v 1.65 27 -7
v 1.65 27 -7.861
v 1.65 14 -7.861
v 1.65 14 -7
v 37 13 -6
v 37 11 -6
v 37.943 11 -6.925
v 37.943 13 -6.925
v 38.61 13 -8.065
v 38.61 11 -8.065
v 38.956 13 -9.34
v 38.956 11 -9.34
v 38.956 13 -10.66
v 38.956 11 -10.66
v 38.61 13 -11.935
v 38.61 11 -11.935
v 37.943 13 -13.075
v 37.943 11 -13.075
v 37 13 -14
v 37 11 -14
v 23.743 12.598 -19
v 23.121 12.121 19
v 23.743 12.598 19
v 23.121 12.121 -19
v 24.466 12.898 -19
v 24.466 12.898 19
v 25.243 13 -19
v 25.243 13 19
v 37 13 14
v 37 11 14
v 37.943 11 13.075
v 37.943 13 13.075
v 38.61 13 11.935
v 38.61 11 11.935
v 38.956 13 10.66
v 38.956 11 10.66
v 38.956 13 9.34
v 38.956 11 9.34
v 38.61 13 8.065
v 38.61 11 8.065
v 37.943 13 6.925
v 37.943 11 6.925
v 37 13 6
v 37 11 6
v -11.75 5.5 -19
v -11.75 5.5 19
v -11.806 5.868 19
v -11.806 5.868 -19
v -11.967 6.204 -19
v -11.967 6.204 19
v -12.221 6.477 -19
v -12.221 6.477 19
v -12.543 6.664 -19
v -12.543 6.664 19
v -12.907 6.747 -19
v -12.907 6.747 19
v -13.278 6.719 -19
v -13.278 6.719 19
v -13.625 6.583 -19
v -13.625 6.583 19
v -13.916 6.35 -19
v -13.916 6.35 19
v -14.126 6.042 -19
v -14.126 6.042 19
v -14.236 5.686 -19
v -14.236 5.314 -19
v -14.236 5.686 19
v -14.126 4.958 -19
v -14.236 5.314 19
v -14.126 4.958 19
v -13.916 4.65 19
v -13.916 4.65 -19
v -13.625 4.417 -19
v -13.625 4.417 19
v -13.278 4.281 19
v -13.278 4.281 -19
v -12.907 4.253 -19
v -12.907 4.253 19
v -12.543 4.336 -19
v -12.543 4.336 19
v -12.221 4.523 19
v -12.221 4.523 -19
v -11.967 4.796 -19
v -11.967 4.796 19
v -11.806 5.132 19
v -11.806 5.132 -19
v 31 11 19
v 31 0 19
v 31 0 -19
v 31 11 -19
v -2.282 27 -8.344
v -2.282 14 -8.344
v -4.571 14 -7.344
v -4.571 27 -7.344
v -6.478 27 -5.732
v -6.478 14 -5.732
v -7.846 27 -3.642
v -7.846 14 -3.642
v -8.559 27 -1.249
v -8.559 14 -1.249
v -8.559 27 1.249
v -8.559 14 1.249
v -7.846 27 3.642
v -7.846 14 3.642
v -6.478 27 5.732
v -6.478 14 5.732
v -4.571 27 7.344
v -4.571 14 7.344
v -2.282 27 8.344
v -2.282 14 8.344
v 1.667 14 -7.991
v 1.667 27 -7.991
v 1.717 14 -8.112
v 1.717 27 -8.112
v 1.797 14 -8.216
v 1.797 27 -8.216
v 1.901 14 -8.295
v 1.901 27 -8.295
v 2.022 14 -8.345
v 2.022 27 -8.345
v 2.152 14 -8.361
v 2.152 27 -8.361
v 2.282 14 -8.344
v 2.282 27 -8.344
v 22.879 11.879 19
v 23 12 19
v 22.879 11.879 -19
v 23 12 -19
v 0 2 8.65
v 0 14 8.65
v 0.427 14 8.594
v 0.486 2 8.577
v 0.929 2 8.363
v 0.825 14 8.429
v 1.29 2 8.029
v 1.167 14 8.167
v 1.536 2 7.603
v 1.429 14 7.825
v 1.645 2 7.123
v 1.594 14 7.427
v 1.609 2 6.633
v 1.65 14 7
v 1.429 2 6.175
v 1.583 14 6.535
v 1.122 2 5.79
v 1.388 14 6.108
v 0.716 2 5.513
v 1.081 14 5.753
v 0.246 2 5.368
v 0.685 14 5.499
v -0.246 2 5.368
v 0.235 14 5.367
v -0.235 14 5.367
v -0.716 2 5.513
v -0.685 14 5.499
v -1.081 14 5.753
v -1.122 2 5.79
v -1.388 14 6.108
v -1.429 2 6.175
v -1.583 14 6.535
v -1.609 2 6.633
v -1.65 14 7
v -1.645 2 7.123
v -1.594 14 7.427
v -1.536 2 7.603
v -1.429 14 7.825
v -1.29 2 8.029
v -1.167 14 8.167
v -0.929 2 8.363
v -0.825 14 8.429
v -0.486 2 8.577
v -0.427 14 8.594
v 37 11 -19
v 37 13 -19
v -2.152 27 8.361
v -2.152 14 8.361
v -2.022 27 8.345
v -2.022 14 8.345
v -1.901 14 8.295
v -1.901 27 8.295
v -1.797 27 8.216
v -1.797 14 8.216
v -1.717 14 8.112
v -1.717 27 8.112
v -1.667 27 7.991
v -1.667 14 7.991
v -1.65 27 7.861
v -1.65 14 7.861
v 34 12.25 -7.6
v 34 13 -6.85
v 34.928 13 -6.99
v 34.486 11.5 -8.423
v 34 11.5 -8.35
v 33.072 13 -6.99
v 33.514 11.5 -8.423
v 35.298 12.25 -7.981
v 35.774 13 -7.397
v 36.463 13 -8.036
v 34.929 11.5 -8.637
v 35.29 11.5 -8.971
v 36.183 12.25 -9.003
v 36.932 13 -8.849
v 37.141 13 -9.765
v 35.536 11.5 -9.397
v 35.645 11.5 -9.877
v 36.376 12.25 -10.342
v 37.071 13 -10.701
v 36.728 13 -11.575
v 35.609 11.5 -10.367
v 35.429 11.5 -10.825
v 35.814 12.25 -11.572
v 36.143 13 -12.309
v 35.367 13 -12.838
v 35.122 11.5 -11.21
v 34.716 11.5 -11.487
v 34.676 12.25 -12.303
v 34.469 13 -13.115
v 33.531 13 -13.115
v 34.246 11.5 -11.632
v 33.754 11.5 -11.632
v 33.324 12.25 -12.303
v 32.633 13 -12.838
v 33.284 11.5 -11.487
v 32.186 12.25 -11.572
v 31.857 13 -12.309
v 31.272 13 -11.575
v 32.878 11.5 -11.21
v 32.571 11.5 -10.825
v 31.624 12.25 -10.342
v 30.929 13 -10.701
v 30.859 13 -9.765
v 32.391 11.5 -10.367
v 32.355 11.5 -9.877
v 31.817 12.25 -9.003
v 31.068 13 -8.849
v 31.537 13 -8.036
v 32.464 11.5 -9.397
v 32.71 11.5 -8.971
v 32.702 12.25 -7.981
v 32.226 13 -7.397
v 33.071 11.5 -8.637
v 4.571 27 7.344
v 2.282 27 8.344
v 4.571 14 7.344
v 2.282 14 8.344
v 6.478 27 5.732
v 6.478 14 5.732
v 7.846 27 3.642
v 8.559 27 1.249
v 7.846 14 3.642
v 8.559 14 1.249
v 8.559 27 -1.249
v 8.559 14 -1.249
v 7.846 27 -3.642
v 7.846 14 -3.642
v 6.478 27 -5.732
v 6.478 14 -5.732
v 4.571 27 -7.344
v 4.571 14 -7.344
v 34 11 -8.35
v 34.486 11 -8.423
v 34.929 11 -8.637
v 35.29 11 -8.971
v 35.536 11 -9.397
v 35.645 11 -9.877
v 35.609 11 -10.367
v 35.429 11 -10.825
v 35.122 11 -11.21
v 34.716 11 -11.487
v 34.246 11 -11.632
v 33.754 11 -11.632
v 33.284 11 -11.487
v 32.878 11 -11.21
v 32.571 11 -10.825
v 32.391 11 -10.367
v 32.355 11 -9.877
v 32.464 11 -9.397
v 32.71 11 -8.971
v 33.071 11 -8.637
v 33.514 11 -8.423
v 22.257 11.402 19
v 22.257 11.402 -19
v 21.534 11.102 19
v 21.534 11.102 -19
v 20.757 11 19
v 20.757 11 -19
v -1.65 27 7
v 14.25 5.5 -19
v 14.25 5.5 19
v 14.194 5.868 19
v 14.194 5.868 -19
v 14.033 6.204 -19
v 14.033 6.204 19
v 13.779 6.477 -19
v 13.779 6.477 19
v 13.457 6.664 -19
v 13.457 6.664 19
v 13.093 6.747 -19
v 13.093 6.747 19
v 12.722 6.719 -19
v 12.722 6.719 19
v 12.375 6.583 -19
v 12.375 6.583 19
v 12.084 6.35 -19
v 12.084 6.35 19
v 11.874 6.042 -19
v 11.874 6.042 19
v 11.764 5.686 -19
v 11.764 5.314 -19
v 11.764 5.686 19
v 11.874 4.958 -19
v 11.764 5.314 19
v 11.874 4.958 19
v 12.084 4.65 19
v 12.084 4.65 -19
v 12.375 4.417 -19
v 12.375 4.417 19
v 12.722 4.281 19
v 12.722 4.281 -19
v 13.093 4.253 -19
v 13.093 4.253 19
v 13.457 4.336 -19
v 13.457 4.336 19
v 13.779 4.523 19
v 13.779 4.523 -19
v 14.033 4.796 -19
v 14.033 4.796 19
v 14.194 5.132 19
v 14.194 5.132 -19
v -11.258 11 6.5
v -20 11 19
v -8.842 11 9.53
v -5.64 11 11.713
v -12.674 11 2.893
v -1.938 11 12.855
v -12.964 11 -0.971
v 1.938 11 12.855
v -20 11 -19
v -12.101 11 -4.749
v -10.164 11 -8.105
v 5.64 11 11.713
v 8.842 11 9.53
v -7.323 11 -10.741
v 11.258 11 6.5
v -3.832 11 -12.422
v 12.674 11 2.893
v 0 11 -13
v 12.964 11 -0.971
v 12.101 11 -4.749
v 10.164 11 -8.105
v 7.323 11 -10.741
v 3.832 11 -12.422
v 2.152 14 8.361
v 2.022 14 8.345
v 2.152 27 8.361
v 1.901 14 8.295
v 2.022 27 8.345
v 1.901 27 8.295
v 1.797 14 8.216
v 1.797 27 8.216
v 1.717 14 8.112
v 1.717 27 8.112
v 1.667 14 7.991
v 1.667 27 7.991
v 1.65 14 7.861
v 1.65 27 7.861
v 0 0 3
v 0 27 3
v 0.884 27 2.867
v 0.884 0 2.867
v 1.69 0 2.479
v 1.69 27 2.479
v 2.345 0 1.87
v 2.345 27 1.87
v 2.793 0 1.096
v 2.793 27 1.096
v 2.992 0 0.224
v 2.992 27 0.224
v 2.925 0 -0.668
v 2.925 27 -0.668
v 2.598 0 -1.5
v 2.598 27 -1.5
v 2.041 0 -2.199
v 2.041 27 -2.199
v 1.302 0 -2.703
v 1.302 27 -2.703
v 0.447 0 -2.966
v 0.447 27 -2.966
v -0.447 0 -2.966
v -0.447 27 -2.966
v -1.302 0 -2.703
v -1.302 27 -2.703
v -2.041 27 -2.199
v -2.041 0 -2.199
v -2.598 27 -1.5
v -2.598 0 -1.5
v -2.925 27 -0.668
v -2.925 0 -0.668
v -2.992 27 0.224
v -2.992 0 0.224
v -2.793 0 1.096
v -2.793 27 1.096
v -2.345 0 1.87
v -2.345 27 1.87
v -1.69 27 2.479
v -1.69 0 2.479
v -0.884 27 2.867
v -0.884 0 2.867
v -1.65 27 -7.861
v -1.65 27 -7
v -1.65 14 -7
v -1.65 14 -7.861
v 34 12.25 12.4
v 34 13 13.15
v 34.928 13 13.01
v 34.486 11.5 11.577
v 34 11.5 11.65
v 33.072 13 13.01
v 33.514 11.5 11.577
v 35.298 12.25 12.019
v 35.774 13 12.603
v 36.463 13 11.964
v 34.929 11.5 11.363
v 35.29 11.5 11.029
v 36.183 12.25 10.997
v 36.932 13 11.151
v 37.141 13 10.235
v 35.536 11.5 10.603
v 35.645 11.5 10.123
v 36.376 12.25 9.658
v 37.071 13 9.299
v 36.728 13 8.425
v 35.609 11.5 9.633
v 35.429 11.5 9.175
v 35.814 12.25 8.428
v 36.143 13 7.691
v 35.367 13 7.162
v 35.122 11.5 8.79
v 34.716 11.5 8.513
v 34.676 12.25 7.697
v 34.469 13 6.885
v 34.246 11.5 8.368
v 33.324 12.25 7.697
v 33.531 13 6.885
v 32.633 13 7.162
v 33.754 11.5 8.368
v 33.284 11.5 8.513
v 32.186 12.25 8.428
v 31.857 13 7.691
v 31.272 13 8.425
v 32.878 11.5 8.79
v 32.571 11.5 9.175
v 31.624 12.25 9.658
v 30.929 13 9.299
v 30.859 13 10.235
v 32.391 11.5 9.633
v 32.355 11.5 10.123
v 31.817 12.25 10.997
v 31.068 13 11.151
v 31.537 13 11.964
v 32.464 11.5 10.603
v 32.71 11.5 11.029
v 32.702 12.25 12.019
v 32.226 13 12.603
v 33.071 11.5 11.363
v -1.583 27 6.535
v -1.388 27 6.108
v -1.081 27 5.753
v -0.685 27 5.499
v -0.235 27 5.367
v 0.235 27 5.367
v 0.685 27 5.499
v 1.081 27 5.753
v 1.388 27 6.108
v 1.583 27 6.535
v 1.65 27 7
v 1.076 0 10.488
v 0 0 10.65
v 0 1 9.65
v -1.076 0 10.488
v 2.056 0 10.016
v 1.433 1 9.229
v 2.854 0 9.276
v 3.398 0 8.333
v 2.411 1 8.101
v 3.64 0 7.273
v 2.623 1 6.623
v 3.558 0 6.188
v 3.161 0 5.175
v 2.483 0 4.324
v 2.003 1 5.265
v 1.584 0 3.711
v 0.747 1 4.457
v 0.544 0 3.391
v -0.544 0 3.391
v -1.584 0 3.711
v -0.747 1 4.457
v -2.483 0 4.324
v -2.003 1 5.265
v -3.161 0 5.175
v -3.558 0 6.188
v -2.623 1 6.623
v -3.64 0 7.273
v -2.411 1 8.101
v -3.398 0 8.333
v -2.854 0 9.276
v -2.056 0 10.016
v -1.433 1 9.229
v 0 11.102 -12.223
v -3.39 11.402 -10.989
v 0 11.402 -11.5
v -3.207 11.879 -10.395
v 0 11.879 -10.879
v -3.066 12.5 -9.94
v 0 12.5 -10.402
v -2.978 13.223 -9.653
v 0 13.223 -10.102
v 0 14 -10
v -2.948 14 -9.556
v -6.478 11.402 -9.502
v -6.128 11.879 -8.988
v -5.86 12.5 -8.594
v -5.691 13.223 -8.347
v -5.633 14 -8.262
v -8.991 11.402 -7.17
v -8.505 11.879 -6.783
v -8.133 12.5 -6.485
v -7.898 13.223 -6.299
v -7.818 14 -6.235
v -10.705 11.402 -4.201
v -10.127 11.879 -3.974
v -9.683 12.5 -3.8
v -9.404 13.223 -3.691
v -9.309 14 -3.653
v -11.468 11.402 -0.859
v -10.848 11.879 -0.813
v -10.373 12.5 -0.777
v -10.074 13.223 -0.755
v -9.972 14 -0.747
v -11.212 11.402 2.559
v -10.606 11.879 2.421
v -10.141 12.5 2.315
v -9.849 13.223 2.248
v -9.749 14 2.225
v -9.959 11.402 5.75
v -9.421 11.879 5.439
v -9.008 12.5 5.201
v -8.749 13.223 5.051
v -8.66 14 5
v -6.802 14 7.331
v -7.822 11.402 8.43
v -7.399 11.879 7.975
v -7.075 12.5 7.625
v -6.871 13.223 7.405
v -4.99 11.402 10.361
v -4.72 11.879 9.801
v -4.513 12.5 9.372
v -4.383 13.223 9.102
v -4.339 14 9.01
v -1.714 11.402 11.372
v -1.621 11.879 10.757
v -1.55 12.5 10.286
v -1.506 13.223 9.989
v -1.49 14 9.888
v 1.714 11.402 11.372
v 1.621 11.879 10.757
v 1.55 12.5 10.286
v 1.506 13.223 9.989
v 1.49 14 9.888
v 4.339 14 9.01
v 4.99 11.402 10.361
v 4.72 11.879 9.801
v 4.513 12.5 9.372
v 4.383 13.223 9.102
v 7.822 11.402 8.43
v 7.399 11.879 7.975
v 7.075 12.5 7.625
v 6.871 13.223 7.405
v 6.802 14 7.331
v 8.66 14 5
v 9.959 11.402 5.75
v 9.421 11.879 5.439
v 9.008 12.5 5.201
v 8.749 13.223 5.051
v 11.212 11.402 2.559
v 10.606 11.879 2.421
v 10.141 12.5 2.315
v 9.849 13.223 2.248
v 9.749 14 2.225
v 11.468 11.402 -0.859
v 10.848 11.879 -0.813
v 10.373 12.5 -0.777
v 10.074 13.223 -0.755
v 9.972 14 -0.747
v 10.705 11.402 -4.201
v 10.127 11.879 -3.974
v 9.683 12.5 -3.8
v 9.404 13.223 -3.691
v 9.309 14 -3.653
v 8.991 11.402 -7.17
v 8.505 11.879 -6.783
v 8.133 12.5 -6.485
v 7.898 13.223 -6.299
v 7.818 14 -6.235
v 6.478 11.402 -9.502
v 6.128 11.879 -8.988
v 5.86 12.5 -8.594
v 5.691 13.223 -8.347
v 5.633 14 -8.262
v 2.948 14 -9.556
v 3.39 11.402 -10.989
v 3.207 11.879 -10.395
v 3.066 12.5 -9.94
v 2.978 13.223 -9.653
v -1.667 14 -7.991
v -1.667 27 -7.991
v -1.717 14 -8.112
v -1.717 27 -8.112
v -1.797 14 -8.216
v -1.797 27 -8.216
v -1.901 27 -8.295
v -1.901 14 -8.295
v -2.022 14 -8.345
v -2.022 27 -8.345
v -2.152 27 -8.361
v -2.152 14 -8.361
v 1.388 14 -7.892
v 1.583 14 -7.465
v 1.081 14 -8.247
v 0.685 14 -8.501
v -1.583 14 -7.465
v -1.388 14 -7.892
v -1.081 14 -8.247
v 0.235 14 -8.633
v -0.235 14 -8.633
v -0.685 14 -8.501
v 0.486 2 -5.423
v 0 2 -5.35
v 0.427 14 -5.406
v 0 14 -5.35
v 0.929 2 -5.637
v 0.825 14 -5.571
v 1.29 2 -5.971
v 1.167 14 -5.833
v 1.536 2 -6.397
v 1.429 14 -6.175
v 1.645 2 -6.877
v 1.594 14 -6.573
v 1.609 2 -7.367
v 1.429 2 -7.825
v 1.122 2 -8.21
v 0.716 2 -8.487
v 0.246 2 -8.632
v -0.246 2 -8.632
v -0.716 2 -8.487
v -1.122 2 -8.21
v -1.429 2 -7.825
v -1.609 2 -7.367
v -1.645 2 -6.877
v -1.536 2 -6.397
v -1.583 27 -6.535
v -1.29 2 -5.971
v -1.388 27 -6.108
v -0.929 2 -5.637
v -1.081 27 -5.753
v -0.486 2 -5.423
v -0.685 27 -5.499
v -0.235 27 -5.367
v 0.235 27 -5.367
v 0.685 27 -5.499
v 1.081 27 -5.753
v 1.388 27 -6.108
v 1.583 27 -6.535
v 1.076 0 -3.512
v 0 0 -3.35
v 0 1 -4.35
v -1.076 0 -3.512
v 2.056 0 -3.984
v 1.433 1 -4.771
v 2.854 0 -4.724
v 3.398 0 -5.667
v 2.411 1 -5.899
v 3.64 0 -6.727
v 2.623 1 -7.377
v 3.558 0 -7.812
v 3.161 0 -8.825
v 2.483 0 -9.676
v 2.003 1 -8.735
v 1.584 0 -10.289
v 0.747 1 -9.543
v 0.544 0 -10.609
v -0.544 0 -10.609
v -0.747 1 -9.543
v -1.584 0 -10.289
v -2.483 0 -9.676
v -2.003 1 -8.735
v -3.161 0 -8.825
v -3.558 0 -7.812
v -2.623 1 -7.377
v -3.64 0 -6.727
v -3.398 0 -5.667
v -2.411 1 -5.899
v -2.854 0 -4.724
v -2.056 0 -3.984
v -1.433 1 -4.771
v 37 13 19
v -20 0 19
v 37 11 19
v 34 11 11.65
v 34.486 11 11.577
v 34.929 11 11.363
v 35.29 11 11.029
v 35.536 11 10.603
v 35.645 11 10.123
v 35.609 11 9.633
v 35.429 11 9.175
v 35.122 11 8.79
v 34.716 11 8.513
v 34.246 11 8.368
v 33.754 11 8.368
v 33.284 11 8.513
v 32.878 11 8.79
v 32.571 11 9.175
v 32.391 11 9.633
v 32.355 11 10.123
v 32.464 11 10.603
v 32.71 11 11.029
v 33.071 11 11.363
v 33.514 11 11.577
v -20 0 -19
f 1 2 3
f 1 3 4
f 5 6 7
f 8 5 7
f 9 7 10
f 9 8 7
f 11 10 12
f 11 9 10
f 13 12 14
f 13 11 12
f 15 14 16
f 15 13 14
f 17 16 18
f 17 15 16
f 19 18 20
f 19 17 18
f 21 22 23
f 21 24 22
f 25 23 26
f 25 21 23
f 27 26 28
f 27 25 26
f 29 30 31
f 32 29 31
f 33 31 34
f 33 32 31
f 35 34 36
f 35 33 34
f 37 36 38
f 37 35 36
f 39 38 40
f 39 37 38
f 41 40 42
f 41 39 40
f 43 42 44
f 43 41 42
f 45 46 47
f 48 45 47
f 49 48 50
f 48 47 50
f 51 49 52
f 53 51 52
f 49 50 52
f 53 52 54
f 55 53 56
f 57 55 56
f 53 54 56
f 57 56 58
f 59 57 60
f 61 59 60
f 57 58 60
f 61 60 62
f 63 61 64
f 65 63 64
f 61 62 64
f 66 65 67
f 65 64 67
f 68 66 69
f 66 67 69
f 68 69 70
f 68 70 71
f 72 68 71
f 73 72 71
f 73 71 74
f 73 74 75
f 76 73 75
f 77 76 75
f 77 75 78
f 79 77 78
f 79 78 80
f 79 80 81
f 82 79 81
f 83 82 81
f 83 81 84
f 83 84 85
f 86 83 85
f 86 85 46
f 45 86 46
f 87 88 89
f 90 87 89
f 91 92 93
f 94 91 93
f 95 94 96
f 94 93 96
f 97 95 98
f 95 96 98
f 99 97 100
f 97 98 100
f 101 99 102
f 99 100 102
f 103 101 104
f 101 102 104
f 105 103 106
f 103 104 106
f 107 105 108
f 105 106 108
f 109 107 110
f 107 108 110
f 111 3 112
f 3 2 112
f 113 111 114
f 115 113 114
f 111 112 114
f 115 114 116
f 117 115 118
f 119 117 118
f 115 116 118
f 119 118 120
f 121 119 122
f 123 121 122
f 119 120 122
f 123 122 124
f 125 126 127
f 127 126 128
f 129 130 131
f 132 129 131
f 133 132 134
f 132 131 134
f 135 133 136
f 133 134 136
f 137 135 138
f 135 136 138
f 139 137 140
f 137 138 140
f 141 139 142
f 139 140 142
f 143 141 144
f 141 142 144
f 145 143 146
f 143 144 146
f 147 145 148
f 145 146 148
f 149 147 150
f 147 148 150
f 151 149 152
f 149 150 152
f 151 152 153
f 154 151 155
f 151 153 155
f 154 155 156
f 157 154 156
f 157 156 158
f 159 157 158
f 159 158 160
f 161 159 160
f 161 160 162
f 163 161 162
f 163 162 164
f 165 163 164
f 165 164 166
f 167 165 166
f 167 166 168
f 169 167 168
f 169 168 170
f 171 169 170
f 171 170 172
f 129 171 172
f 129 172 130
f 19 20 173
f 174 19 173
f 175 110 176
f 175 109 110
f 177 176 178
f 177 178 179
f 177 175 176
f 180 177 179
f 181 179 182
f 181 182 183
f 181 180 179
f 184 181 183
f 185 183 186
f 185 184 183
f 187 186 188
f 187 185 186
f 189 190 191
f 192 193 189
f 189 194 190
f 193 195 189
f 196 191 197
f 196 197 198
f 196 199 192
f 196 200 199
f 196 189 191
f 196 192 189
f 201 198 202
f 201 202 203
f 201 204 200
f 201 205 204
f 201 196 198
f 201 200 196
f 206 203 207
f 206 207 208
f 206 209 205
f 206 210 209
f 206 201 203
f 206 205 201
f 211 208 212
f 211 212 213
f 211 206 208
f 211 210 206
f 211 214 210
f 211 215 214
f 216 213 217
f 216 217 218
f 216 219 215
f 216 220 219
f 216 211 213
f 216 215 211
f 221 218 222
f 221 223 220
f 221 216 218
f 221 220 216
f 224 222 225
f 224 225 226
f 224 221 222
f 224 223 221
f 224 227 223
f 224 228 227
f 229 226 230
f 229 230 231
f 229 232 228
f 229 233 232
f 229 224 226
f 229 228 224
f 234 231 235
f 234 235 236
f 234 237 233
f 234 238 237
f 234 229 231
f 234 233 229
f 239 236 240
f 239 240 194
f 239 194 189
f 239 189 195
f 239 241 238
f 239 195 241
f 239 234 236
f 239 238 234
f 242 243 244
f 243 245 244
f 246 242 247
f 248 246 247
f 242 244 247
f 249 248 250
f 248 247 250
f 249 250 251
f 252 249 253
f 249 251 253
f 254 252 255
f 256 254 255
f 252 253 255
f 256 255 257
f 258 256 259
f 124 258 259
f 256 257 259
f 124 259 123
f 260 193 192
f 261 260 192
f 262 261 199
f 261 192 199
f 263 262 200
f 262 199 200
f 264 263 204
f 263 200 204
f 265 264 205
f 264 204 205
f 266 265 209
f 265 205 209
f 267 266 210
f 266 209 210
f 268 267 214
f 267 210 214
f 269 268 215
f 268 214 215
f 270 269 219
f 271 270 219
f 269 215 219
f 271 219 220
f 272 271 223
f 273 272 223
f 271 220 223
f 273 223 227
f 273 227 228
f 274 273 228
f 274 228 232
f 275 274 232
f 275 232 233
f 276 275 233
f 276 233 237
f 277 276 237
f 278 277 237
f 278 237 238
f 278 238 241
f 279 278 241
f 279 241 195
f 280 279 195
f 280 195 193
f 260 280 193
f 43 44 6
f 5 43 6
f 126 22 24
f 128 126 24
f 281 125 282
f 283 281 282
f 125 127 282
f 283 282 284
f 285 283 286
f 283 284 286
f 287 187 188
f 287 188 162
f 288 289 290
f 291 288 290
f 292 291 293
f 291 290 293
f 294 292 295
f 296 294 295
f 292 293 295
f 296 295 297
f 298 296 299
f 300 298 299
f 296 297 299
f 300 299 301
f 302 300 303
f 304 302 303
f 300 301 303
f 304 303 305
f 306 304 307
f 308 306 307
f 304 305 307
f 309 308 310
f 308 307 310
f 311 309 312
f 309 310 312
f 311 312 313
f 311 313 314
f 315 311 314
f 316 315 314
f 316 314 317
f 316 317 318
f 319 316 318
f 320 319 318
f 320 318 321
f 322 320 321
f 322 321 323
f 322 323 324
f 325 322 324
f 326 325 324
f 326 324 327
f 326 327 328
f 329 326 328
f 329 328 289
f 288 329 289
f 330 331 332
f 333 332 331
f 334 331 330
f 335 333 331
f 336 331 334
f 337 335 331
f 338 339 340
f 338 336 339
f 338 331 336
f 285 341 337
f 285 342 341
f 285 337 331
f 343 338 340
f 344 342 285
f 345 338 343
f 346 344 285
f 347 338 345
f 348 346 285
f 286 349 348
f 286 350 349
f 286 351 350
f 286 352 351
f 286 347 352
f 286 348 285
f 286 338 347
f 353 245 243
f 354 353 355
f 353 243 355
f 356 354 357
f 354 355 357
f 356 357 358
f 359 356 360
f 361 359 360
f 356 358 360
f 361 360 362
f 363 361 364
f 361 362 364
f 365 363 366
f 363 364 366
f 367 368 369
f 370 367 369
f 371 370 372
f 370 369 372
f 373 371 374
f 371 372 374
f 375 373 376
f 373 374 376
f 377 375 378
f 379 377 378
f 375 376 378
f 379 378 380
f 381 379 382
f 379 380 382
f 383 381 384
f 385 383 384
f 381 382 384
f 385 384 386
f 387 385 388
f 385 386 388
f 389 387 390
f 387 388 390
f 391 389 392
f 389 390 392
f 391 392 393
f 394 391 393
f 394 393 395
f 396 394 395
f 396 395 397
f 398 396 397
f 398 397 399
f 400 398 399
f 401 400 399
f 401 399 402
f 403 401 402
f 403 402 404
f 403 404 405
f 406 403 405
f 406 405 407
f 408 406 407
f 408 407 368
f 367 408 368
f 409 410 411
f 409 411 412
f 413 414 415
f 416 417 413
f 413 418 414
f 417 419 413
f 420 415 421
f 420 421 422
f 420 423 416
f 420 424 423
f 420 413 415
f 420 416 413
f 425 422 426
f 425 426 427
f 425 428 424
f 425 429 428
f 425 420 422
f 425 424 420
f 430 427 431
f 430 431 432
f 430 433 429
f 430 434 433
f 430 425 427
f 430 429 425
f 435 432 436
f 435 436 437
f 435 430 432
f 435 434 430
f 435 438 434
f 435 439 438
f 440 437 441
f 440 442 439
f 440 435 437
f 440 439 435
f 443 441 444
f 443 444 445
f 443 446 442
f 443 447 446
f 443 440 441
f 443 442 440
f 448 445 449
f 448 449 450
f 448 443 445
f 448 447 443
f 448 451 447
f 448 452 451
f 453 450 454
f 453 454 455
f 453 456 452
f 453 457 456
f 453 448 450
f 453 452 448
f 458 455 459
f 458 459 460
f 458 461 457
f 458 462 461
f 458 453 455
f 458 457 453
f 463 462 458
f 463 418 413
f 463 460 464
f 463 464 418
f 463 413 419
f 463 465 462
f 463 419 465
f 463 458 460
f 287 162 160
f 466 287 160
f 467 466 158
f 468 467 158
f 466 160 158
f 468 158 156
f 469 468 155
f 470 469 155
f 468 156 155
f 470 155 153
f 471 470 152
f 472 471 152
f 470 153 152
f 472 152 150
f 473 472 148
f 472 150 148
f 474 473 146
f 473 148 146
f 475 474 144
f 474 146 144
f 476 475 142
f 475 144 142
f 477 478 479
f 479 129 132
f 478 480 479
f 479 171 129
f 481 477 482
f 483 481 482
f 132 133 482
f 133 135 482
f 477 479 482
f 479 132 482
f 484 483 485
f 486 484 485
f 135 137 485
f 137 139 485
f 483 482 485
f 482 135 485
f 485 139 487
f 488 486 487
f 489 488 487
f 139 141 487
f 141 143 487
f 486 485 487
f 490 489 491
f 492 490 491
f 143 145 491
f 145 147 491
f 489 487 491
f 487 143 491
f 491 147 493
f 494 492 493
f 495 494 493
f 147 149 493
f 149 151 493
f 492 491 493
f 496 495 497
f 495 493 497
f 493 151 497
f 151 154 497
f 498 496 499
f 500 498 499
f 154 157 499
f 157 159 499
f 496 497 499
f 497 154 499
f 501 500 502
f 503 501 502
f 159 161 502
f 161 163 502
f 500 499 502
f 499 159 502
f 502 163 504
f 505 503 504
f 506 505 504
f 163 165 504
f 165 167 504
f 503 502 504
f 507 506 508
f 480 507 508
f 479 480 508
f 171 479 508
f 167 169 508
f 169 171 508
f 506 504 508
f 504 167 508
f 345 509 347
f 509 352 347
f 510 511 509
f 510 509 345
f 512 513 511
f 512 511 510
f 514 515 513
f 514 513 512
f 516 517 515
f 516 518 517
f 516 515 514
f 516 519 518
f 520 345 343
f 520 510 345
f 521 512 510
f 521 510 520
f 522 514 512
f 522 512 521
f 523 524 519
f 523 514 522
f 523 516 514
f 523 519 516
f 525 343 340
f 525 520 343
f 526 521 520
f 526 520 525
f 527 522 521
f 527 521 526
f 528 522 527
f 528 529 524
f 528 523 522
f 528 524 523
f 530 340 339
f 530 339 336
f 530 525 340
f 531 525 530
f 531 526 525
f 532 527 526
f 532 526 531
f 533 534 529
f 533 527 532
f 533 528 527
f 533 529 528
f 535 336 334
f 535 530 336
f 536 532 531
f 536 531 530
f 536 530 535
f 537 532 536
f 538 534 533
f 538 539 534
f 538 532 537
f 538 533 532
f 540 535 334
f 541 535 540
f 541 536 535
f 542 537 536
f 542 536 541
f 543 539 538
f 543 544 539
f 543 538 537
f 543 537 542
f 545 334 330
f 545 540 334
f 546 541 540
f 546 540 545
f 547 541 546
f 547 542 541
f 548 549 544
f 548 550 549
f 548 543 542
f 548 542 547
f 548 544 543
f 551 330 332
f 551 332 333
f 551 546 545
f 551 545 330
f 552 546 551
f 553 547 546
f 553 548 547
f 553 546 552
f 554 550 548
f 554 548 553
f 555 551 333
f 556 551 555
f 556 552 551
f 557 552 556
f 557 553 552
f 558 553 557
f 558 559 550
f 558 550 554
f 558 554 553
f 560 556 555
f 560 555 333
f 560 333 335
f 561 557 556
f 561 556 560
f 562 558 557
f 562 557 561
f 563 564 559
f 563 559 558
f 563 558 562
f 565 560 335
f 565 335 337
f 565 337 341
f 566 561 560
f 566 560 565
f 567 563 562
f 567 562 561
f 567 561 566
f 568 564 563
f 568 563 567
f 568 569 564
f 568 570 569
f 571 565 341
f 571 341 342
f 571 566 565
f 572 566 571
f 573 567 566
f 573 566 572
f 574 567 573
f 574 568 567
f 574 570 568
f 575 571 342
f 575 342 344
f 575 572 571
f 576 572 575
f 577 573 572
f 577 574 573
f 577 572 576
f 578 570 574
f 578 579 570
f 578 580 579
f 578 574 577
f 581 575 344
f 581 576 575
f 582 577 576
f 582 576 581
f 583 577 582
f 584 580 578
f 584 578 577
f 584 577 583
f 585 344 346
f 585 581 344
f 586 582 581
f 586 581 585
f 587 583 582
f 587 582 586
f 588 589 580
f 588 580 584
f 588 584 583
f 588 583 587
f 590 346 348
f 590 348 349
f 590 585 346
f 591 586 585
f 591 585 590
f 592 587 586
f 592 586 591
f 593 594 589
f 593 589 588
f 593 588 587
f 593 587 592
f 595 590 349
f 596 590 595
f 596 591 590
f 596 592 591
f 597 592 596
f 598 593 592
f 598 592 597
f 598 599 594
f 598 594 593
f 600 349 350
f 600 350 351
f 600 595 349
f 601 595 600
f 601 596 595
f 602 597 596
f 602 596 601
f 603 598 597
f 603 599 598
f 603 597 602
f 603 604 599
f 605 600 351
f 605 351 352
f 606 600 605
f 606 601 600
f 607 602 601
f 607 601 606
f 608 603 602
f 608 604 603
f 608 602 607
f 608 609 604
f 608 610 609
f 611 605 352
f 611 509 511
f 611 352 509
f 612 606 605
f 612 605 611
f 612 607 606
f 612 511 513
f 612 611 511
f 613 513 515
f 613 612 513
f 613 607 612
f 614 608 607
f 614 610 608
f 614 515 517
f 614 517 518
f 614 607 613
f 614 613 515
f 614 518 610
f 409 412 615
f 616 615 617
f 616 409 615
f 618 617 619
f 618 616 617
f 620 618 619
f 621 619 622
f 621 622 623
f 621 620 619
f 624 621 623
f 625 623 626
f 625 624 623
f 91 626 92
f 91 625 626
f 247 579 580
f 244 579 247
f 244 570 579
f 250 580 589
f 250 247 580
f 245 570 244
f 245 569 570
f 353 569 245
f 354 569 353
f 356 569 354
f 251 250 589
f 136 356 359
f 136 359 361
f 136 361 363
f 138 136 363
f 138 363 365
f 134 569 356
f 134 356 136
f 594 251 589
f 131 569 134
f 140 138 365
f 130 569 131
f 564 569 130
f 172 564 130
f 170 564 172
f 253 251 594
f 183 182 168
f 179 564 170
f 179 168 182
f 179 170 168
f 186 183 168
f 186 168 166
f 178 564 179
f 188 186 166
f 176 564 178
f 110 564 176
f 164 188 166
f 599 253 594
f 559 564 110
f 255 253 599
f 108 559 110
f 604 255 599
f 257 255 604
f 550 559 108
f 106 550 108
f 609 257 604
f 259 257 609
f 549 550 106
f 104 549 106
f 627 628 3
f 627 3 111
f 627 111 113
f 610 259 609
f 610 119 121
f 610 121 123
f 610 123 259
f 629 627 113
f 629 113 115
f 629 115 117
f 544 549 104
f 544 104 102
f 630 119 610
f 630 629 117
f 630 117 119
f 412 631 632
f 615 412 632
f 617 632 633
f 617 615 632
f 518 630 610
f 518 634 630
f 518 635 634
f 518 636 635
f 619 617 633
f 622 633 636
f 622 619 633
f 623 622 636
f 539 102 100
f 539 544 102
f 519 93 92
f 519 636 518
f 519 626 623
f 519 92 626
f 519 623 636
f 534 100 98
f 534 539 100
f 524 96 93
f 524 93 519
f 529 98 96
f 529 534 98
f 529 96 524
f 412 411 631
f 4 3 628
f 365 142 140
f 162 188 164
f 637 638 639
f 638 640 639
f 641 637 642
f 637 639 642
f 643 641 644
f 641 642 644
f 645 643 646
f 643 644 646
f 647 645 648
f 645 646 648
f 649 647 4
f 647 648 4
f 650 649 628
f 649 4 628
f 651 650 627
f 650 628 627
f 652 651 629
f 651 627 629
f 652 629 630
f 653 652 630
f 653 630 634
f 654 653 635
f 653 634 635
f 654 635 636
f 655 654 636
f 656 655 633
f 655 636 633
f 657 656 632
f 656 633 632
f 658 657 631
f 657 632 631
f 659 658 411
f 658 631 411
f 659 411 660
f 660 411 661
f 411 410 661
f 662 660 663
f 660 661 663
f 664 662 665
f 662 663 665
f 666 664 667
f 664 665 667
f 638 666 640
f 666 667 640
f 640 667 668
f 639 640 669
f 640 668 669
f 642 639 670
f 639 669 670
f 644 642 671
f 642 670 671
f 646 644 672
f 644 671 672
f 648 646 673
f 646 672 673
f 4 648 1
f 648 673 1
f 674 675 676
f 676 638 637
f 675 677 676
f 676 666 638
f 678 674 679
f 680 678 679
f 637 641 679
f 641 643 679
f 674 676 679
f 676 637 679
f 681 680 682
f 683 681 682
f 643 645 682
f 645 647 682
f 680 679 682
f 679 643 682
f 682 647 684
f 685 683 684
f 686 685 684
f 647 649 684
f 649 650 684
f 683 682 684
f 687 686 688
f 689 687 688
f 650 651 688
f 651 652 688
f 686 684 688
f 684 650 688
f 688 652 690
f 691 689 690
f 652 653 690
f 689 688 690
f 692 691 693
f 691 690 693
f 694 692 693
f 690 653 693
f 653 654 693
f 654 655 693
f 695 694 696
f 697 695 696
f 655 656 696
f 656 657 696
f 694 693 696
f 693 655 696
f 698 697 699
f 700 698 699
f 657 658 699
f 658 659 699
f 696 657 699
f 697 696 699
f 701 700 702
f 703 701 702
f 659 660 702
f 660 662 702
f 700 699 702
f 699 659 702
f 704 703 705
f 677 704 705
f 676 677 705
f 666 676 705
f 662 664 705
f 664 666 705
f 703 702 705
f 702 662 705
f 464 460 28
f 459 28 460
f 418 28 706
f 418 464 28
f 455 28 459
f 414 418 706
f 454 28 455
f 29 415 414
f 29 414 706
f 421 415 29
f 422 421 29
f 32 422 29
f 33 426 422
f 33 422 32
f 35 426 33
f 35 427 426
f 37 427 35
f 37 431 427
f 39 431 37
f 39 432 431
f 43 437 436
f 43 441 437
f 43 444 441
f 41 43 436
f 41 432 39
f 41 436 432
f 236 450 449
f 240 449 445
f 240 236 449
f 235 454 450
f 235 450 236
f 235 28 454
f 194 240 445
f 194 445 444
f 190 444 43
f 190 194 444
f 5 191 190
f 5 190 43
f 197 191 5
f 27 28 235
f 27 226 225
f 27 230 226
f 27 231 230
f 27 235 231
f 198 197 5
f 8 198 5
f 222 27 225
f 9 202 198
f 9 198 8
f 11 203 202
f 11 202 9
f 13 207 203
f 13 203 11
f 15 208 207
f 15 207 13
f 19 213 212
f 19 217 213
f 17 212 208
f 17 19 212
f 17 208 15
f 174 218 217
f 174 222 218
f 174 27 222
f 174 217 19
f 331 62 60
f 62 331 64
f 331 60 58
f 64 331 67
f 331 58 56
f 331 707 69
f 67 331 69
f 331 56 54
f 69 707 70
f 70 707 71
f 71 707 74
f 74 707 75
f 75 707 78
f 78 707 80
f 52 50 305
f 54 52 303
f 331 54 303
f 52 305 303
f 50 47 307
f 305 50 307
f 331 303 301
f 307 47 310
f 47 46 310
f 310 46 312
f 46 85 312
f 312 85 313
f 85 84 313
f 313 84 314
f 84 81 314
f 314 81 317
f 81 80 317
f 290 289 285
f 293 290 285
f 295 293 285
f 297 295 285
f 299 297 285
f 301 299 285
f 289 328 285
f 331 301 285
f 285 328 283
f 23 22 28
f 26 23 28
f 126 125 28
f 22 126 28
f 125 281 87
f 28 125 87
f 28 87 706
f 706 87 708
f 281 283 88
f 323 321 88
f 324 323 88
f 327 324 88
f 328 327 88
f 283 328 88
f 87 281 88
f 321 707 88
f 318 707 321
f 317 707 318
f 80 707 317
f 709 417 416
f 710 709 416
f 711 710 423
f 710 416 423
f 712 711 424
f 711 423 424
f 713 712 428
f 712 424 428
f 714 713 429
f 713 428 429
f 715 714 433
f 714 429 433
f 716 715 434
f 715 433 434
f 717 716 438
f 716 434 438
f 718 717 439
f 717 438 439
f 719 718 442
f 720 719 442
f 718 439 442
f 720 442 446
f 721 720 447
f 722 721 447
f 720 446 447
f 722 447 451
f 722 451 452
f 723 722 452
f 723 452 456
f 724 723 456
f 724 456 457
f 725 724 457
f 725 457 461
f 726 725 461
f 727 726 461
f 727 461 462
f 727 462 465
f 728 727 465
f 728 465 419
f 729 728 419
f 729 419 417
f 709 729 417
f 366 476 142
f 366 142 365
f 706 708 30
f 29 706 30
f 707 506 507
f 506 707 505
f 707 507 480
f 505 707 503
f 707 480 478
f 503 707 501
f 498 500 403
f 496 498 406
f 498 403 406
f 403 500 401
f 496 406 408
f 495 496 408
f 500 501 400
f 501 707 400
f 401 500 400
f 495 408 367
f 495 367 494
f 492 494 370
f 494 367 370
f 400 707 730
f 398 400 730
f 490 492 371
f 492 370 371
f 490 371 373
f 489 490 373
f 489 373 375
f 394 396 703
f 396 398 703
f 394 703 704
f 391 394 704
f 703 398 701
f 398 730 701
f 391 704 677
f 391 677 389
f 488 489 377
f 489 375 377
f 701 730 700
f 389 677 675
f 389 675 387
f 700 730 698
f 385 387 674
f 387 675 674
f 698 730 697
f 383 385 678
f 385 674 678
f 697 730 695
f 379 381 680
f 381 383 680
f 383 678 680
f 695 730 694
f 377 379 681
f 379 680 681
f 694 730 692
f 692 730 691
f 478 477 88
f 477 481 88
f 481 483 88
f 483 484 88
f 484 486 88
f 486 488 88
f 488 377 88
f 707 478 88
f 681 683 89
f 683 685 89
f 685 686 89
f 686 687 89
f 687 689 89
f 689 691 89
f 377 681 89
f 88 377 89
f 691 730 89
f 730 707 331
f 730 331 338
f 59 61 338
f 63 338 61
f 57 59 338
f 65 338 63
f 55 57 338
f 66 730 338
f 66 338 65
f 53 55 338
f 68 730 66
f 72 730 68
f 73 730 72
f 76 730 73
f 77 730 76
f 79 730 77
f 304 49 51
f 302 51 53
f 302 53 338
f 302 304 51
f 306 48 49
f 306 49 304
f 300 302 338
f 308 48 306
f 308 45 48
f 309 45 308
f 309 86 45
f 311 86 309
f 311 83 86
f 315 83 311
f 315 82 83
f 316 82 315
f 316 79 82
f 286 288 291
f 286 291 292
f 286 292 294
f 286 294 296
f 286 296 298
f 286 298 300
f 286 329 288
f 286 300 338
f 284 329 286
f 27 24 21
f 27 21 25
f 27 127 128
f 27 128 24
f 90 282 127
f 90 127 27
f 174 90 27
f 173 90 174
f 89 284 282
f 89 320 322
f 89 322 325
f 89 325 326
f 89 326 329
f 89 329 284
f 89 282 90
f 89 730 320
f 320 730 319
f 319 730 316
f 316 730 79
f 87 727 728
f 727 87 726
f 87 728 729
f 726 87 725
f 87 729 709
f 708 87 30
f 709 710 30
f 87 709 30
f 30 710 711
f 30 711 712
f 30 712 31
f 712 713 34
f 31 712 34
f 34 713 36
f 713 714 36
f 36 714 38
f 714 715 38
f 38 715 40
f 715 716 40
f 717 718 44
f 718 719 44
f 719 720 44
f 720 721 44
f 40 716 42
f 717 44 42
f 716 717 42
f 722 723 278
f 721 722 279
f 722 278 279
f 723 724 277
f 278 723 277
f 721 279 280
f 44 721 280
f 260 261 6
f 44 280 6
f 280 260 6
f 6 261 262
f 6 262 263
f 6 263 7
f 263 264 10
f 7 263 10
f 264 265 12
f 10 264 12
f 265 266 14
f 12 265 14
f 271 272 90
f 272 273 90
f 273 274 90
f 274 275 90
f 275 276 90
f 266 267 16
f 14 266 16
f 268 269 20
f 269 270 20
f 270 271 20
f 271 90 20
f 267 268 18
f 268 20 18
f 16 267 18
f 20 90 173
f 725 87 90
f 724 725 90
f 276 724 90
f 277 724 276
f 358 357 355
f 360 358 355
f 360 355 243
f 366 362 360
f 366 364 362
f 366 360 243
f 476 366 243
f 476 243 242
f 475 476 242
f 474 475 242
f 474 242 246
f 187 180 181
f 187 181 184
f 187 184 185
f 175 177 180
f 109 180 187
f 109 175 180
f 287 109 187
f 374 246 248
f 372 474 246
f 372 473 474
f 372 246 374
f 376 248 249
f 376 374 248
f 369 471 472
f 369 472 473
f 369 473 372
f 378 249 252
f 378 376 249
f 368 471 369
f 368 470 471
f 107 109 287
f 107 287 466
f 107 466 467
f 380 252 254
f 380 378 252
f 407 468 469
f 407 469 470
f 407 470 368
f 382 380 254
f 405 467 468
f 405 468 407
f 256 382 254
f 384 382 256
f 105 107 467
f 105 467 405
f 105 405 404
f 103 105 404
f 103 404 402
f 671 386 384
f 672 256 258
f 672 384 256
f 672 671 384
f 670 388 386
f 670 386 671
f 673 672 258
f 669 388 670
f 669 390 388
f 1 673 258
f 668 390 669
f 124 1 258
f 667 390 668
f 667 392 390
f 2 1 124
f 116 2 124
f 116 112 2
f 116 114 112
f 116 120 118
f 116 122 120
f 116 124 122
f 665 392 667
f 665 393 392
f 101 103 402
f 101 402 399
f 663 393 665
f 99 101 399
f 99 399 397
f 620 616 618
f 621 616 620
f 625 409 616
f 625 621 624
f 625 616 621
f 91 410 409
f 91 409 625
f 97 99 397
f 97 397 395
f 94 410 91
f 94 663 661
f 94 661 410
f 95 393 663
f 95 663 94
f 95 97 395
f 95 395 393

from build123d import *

# Parameters (mm, degrees)
SKETCH_6_W             = 51
SKETCH_6_H             = 38
EXTRUDE_647_DEPTH      = 11
SKETCH_10_R            = 10
EXTRUDE_856_DEPTH      = 3
FILLET_1_R             = 3
SKETCH_13_R            = 1.25
CUT_EXTRUDE_1173_DEPTH = 52
SKETCH_15_R            = 8.65
EXTRUDE_1309_DEPTH     = 13
CUT_EXTRUDE_START      = -13
CUT_EXTRUDE_1600_DEPTH = 13
SKETCH_26_R            = 1.65
CUT_EXTRUDE_1838_DEPTH = 39.961519478
CHAMFER_7_SIZE         = 2
SKETCH_17_R            = 3
CUT_EXTRUDE_2253_DEPTH = 46.287967497
SKETCH_19_W            = 14
SKETCH_19_H            = 38
EXTRUDE_2866_DEPTH     = 2
SKETCH_20_R            = 1.65
CUT_EXTRUDE_3095_DEPTH = 44.886216515
SKETCH_23_R            = 5
SKETCH_23_R_2          = 1.65
EXTRUDE_3300_DEPTH     = 2
CHAMFER_4_SIZE         = 1
FILLET_7_R             = 3
CHAMFER_6_SIZE         = 1.5
FILLET_8_R             = 0.5


with BuildPart() as part:
    # Эскиз6 → Extrude 647 (new body)
    with BuildSketch(Plane(origin=(0, 0, 0), x_dir=(1, 0, 0), z_dir=(0, 1, 0))):
        with Locations((5.5, 0)):
            Rectangle(SKETCH_6_W, SKETCH_6_H)
    extrude(amount=EXTRUDE_647_DEPTH)

    # Эскиз10 → Extrude 856 (add)
    with BuildSketch(Plane(origin=(0, 11, 0), x_dir=(1, 0, 0), z_dir=(0, 1, 0))):
        with Locations(Location((0, 0, 0), (0, 0, 90))):
            Circle(SKETCH_10_R)
    extrude(amount=EXTRUDE_856_DEPTH)

    # Скругление1
    fillet_1_edges = [part.edges().sort_by_distance(p)[0] for p in [
        (0, 11, 10),
    ]]
    fillet(fillet_1_edges, radius=FILLET_1_R - 0.0001)  # a hair under: the kernel refuses the full size

    # Эскиз13 → Cut-Extrude 1173 (cut, through all)
    with BuildSketch(Plane.XY.offset(19)):
        with Locations((-13, 5.5)):
            Circle(SKETCH_13_R)
        with Locations((13, 5.5)):
            Circle(SKETCH_13_R)
    extrude(amount=-CUT_EXTRUDE_1173_DEPTH, mode=Mode.SUBTRACT)

    # Эскиз15 → Extrude 1309 (add)
    with BuildSketch(Plane(origin=(0, 14, 0), x_dir=(1, 0, 0), z_dir=(0, 1, 0))):
        with Locations(Location((0, 0, 0), (0, 0, 90))):
            Circle(SKETCH_15_R)
    extrude(amount=EXTRUDE_1309_DEPTH)

    # Эскиз16 → Cut-Extrude 1600 (cut)
    with BuildSketch(Plane(origin=(0, 27, 0), x_dir=(1, 0, 0), z_dir=(0, 1, 0)).offset(CUT_EXTRUDE_START)):
        with BuildLine():
            Line((-1.65, 7), (-1.65, 8.491171886))
            ThreePointArc((-1.65, 8.491171886), (0, 8.65), (1.65, 8.491171886))
            Line((1.65, 8.491171886), (1.65, 7))
            ThreePointArc((1.65, 7), (0, 5.35), (-1.65, 7))
        make_face()
        with BuildLine():
            Line((1.65, -7), (1.65, -8.491171886))
            ThreePointArc((1.65, -8.491171886), (0, -8.65), (-1.65, -8.491171886))
            Line((-1.65, -8.491171886), (-1.65, -7))
            ThreePointArc((-1.65, -7), (0, -5.35), (1.65, -7))
        make_face()
    extrude(amount=CUT_EXTRUDE_1600_DEPTH, mode=Mode.SUBTRACT)

    # Эскиз26 → Cut-Extrude 1838 (cut, through all)
    with BuildSketch(Plane(origin=(0, 14, 0), x_dir=(1, 0, 0), z_dir=(0, 1, 0))):
        with Locations(Location((0, 7, 0), (0, 0, 270))):
            Circle(SKETCH_26_R)
        with Locations(Location((0, -7, 0), (0, 0, 270))):
            Circle(SKETCH_26_R)
    extrude(amount=-CUT_EXTRUDE_1838_DEPTH, mode=Mode.SUBTRACT)

    # Фаска7
    chamfer_7_edges = [part.edges().sort_by_distance(p)[0] for p in [
        (0, 0, -8.65),
        (0, 0, 5.35),
    ]]
    chamfer(chamfer_7_edges, length=CHAMFER_7_SIZE)

    # Эскиз17 → Cut-Extrude 2253 (cut, through all)
    with BuildSketch(Plane(origin=(0, 27, 0), x_dir=(1, 0, 0), z_dir=(0, 1, 0))):
        with Locations(Location((0, 0, 0), (0, 0, 270))):
            Circle(SKETCH_17_R)
    extrude(amount=-CUT_EXTRUDE_2253_DEPTH, mode=Mode.SUBTRACT)

    # Эскиз19 → Extrude 2866 (add)
    with BuildSketch(Plane(origin=(0, 11, 0), x_dir=(1, 0, 0), z_dir=(0, 1, 0))):
        with Locations((30, 0)):
            Rectangle(SKETCH_19_W, SKETCH_19_H)
    extrude(amount=EXTRUDE_2866_DEPTH)

    # Эскиз20 → Cut-Extrude 3095 (cut, through all)
    with BuildSketch(Plane(origin=(0, 13, 0), x_dir=(1, 0, 0), z_dir=(0, 1, 0))):
        with Locations(Location((34, 10, 0), (0, 0, 270))):
            Circle(SKETCH_20_R)
        with Locations(Location((34, -10, 0), (0, 0, 270))):
            Circle(SKETCH_20_R)
    extrude(amount=-CUT_EXTRUDE_3095_DEPTH, mode=Mode.SUBTRACT)

    # Эскиз23 → Extrude 3300 (add)
    # profile 1 of 2: a face of its own
    with BuildSketch(Plane(origin=(0, 13, 0), x_dir=(1, 0, 0), z_dir=(0, 1, 0))):
        with Locations((34, 10)):
            Circle(SKETCH_23_R)
        with Locations(Location((34, 10, 0), (0, 0, 270))):
            Circle(SKETCH_23_R_2, mode=Mode.SUBTRACT)
    # profile 2 of 2: a face of its own
    with BuildSketch(Plane(origin=(0, 13, 0), x_dir=(1, 0, 0), z_dir=(0, 1, 0))):
        with Locations((34, -10)):
            Circle(SKETCH_23_R)
        with Locations(Location((34, -10, 0), (0, 0, 270))):
            Circle(SKETCH_23_R_2, mode=Mode.SUBTRACT)
    extrude(amount=-EXTRUDE_3300_DEPTH)

    # Фаска4
    chamfer_4_edges = [part.edges().sort_by_distance(p)[0] for p in [
        (23, 11, 0),
    ]]
    chamfer(chamfer_4_edges, length=CHAMFER_4_SIZE)
    chamfer_4_2_edges = [part.edges().sort_by_distance(p)[0] for p in [
        (23, 13, 0),
    ]]
    chamfer(chamfer_4_2_edges, length=CHAMFER_4_SIZE - 0.0001)  # a hair under: the kernel refuses the full size

    # Скругление7
    fillet_7_edges = [part.edges().sort_by_distance(p)[0] for p in [
        (23.9999, 13, 0),
        (22, 11, 0),
    ]]
    fillet(fillet_7_edges, radius=FILLET_7_R)

    # Фаска6
    chamfer_6_edges = [part.edges().sort_by_distance(p)[0] for p in [
        (34, 13, -11.65),
        (34, 13, 8.35),
    ]]
    chamfer(chamfer_6_edges, length=CHAMFER_6_SIZE)

    # Скругление8
    fillet_8_edges = [part.edges().sort_by_distance(p)[0] for p in [
        (-1.65, 20.5, -8.491171886),
        (1.65, 20.5, -8.491171886),
        (1.65, 20.5, 8.491171886),
        (-1.65, 20.5, 8.491171886),
    ]]
    fillet(fillet_8_edges, radius=FILLET_8_R)


solid = part.part
